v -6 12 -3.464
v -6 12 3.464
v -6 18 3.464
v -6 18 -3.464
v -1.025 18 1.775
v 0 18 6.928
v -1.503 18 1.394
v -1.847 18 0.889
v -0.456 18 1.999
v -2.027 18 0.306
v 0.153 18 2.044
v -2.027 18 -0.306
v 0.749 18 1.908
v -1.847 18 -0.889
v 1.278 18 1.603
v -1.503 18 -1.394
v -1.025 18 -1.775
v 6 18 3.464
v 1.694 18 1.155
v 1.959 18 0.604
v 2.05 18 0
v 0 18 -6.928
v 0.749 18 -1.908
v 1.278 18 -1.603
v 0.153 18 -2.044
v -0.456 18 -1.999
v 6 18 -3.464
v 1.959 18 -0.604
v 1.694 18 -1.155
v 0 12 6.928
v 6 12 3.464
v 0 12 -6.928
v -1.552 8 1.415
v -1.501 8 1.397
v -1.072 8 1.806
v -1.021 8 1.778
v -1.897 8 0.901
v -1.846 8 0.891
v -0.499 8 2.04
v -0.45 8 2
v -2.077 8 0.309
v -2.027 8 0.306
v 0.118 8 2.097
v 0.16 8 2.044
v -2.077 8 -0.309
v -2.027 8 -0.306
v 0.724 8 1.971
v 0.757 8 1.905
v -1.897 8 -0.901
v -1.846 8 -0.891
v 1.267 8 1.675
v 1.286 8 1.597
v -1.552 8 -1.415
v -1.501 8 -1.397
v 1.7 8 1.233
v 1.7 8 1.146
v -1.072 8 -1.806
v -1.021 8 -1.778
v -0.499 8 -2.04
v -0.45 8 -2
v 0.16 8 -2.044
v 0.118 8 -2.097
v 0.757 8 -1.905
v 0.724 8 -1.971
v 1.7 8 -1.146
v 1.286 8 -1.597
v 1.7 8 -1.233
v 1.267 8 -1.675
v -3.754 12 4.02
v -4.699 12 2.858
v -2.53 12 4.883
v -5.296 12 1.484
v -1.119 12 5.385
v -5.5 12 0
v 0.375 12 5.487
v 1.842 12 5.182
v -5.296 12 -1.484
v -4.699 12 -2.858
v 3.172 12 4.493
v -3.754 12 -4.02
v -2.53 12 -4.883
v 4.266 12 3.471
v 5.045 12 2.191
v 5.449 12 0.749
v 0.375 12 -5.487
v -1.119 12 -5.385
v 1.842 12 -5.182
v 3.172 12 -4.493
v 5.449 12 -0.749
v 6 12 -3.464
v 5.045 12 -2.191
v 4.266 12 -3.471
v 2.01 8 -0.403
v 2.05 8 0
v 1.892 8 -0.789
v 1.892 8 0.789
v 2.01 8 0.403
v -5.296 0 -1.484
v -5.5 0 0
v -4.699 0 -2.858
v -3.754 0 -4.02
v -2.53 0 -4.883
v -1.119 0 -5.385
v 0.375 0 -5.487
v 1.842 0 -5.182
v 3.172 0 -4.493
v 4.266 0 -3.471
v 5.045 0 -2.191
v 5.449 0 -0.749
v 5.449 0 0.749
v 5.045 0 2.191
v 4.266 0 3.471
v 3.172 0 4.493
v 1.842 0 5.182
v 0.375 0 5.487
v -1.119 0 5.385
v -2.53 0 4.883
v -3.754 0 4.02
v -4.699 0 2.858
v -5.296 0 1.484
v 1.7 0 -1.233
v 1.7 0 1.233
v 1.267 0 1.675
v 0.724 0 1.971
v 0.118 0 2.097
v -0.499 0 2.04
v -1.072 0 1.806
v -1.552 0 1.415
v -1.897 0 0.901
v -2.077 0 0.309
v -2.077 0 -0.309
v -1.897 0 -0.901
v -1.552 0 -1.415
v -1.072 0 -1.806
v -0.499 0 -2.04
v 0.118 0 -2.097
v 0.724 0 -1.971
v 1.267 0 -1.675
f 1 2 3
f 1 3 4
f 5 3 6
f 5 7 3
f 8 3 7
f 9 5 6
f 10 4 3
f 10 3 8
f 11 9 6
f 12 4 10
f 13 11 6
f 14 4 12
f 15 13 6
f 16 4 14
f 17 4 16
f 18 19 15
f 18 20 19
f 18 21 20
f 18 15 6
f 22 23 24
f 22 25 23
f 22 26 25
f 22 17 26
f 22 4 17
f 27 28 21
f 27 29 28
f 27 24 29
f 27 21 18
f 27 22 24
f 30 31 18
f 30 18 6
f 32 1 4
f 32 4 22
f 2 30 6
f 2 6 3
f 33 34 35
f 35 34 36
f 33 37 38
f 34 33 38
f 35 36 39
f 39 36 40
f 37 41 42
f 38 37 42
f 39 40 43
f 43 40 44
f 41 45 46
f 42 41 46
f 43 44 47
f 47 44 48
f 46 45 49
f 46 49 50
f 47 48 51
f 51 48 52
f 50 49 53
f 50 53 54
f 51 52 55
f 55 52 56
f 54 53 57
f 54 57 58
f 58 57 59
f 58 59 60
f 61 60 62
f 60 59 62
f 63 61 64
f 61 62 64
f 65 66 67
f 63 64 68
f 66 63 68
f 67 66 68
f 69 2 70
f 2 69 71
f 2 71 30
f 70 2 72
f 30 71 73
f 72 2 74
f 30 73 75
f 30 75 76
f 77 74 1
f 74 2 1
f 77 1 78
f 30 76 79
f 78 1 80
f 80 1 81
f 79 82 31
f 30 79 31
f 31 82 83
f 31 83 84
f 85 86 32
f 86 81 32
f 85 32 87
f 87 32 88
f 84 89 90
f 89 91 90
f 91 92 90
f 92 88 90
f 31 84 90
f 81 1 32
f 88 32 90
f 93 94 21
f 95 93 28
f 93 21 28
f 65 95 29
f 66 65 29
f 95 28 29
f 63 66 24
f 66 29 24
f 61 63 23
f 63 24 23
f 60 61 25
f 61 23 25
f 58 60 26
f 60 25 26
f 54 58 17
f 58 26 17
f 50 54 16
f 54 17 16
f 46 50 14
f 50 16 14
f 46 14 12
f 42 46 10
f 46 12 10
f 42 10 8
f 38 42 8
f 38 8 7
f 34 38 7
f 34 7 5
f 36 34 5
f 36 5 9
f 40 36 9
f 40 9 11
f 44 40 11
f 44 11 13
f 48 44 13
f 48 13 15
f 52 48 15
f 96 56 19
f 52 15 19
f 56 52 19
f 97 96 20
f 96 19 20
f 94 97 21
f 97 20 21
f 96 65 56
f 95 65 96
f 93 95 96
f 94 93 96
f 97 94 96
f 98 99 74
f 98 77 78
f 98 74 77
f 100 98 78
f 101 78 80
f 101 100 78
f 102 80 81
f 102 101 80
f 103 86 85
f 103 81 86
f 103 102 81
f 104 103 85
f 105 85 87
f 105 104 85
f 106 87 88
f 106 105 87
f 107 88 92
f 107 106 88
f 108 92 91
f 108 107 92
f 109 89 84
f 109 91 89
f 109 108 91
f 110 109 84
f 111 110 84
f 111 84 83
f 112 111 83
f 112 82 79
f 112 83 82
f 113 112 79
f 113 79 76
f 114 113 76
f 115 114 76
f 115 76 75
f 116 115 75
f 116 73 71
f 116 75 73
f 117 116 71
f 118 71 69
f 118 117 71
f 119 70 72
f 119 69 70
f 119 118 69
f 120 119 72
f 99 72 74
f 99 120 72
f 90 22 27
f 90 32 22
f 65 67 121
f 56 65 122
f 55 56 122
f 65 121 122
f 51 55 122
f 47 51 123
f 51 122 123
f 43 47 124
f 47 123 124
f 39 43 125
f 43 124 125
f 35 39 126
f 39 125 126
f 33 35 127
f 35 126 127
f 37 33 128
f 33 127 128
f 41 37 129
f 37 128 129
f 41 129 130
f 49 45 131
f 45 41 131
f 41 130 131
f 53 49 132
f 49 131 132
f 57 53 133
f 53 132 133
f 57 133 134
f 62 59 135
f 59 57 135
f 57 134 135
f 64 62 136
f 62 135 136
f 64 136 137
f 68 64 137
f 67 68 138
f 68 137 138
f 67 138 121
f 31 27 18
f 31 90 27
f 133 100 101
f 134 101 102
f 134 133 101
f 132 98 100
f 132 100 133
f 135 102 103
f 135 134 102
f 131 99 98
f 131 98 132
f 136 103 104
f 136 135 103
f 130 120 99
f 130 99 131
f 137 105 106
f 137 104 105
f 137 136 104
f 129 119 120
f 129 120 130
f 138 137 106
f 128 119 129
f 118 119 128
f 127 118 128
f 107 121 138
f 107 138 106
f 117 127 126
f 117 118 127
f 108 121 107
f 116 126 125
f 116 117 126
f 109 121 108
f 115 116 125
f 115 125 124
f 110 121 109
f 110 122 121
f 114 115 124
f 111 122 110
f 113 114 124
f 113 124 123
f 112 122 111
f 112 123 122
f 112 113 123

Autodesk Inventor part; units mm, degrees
ref_plane "YZ Plane" through (0, 0, 0) normal (1, 0, 0) x (0, 1, 0)
ref_plane "XZ Plane" through (0, 0, 0) normal (0, 1, 0) x (-1, 0, 0)
ref_plane "XY Plane" through (0, 0, 0) normal (0, 0, 1) x (1, 0, 0)
sketch "草圖1" plane through (0, 0, 0) normal (0, 1, 0) x (-1, 0, 0)
  circle A0 centre (0, 0) radius 5.5
  dimension "d0" = 11
extrude "擠出1" add sketch "草圖1" along normal blind 12
sketch "草圖2" plane through (0, 12, 0) normal (0, 1, 0) x (1, 0, 0)
  line L0 (6, -3.4641) -> (0, -6.9282)
  line L1 (0, -6.9282) -> (-6, -3.4641)
  line L2 (-6, -3.4641) -> (-6, 3.4641)
  line L3 (-6, 3.4641) -> (0, 6.9282)
  line L4 (0, 6.9282) -> (6, 3.4641)
  line L5 (6, 3.4641) -> (6, -3.4641)
  point P0 (0, 0)
  point P1 (0, 0)
  dimension "d3" = 12
extrude "擠出2" add sketch "草圖2" along normal blind 6
sketch "草圖3" plane through (0, 0, 0) normal (0, -1, 0) x (1, 0, 0)
  circle A0 centre (0, 0) radius 2.1
  dimension "d6" = 4.2
extrude "擠出3" cut sketch "草圖3" against normal up to surface (18 mm away)
sketch "草圖5" plane through (0, 0, 0) normal (1, 0, 0) x (0, 1, 0)
  circle A0 centre (4, 0) radius 1.361
  point P0 (0, 0)
  dimension "d12" = 4
extrude "擠出5" [suppressed]
sketch "草圖7" plane through (0, 0, 0) normal (0, -1, 0) x (1, 0, 0)
  circle A0 centre (0, 0) radius 2.1 projected
  line L0 (1.7, -1.2329) -> (1.7, 1.2329)
  dimension "d16" = 1.7
extrude "擠出6" add sketch "草圖7" against normal blind 8 contours A0 L0 picked at (1.773, -0.2844)
sketch "草圖8" plane through (0, 18, 0) normal (0, 1, 0) x (1, 0, 0)
  circle A0 centre (0, 0) radius 2.05
  circle A1 centre (0, 0) radius 2.1 projected
  dimension "d19" = 4.1
extrude "擠出7" add sketch "草圖8" against normal up to surface (10 mm away)
properties part number "Coupling_print"
